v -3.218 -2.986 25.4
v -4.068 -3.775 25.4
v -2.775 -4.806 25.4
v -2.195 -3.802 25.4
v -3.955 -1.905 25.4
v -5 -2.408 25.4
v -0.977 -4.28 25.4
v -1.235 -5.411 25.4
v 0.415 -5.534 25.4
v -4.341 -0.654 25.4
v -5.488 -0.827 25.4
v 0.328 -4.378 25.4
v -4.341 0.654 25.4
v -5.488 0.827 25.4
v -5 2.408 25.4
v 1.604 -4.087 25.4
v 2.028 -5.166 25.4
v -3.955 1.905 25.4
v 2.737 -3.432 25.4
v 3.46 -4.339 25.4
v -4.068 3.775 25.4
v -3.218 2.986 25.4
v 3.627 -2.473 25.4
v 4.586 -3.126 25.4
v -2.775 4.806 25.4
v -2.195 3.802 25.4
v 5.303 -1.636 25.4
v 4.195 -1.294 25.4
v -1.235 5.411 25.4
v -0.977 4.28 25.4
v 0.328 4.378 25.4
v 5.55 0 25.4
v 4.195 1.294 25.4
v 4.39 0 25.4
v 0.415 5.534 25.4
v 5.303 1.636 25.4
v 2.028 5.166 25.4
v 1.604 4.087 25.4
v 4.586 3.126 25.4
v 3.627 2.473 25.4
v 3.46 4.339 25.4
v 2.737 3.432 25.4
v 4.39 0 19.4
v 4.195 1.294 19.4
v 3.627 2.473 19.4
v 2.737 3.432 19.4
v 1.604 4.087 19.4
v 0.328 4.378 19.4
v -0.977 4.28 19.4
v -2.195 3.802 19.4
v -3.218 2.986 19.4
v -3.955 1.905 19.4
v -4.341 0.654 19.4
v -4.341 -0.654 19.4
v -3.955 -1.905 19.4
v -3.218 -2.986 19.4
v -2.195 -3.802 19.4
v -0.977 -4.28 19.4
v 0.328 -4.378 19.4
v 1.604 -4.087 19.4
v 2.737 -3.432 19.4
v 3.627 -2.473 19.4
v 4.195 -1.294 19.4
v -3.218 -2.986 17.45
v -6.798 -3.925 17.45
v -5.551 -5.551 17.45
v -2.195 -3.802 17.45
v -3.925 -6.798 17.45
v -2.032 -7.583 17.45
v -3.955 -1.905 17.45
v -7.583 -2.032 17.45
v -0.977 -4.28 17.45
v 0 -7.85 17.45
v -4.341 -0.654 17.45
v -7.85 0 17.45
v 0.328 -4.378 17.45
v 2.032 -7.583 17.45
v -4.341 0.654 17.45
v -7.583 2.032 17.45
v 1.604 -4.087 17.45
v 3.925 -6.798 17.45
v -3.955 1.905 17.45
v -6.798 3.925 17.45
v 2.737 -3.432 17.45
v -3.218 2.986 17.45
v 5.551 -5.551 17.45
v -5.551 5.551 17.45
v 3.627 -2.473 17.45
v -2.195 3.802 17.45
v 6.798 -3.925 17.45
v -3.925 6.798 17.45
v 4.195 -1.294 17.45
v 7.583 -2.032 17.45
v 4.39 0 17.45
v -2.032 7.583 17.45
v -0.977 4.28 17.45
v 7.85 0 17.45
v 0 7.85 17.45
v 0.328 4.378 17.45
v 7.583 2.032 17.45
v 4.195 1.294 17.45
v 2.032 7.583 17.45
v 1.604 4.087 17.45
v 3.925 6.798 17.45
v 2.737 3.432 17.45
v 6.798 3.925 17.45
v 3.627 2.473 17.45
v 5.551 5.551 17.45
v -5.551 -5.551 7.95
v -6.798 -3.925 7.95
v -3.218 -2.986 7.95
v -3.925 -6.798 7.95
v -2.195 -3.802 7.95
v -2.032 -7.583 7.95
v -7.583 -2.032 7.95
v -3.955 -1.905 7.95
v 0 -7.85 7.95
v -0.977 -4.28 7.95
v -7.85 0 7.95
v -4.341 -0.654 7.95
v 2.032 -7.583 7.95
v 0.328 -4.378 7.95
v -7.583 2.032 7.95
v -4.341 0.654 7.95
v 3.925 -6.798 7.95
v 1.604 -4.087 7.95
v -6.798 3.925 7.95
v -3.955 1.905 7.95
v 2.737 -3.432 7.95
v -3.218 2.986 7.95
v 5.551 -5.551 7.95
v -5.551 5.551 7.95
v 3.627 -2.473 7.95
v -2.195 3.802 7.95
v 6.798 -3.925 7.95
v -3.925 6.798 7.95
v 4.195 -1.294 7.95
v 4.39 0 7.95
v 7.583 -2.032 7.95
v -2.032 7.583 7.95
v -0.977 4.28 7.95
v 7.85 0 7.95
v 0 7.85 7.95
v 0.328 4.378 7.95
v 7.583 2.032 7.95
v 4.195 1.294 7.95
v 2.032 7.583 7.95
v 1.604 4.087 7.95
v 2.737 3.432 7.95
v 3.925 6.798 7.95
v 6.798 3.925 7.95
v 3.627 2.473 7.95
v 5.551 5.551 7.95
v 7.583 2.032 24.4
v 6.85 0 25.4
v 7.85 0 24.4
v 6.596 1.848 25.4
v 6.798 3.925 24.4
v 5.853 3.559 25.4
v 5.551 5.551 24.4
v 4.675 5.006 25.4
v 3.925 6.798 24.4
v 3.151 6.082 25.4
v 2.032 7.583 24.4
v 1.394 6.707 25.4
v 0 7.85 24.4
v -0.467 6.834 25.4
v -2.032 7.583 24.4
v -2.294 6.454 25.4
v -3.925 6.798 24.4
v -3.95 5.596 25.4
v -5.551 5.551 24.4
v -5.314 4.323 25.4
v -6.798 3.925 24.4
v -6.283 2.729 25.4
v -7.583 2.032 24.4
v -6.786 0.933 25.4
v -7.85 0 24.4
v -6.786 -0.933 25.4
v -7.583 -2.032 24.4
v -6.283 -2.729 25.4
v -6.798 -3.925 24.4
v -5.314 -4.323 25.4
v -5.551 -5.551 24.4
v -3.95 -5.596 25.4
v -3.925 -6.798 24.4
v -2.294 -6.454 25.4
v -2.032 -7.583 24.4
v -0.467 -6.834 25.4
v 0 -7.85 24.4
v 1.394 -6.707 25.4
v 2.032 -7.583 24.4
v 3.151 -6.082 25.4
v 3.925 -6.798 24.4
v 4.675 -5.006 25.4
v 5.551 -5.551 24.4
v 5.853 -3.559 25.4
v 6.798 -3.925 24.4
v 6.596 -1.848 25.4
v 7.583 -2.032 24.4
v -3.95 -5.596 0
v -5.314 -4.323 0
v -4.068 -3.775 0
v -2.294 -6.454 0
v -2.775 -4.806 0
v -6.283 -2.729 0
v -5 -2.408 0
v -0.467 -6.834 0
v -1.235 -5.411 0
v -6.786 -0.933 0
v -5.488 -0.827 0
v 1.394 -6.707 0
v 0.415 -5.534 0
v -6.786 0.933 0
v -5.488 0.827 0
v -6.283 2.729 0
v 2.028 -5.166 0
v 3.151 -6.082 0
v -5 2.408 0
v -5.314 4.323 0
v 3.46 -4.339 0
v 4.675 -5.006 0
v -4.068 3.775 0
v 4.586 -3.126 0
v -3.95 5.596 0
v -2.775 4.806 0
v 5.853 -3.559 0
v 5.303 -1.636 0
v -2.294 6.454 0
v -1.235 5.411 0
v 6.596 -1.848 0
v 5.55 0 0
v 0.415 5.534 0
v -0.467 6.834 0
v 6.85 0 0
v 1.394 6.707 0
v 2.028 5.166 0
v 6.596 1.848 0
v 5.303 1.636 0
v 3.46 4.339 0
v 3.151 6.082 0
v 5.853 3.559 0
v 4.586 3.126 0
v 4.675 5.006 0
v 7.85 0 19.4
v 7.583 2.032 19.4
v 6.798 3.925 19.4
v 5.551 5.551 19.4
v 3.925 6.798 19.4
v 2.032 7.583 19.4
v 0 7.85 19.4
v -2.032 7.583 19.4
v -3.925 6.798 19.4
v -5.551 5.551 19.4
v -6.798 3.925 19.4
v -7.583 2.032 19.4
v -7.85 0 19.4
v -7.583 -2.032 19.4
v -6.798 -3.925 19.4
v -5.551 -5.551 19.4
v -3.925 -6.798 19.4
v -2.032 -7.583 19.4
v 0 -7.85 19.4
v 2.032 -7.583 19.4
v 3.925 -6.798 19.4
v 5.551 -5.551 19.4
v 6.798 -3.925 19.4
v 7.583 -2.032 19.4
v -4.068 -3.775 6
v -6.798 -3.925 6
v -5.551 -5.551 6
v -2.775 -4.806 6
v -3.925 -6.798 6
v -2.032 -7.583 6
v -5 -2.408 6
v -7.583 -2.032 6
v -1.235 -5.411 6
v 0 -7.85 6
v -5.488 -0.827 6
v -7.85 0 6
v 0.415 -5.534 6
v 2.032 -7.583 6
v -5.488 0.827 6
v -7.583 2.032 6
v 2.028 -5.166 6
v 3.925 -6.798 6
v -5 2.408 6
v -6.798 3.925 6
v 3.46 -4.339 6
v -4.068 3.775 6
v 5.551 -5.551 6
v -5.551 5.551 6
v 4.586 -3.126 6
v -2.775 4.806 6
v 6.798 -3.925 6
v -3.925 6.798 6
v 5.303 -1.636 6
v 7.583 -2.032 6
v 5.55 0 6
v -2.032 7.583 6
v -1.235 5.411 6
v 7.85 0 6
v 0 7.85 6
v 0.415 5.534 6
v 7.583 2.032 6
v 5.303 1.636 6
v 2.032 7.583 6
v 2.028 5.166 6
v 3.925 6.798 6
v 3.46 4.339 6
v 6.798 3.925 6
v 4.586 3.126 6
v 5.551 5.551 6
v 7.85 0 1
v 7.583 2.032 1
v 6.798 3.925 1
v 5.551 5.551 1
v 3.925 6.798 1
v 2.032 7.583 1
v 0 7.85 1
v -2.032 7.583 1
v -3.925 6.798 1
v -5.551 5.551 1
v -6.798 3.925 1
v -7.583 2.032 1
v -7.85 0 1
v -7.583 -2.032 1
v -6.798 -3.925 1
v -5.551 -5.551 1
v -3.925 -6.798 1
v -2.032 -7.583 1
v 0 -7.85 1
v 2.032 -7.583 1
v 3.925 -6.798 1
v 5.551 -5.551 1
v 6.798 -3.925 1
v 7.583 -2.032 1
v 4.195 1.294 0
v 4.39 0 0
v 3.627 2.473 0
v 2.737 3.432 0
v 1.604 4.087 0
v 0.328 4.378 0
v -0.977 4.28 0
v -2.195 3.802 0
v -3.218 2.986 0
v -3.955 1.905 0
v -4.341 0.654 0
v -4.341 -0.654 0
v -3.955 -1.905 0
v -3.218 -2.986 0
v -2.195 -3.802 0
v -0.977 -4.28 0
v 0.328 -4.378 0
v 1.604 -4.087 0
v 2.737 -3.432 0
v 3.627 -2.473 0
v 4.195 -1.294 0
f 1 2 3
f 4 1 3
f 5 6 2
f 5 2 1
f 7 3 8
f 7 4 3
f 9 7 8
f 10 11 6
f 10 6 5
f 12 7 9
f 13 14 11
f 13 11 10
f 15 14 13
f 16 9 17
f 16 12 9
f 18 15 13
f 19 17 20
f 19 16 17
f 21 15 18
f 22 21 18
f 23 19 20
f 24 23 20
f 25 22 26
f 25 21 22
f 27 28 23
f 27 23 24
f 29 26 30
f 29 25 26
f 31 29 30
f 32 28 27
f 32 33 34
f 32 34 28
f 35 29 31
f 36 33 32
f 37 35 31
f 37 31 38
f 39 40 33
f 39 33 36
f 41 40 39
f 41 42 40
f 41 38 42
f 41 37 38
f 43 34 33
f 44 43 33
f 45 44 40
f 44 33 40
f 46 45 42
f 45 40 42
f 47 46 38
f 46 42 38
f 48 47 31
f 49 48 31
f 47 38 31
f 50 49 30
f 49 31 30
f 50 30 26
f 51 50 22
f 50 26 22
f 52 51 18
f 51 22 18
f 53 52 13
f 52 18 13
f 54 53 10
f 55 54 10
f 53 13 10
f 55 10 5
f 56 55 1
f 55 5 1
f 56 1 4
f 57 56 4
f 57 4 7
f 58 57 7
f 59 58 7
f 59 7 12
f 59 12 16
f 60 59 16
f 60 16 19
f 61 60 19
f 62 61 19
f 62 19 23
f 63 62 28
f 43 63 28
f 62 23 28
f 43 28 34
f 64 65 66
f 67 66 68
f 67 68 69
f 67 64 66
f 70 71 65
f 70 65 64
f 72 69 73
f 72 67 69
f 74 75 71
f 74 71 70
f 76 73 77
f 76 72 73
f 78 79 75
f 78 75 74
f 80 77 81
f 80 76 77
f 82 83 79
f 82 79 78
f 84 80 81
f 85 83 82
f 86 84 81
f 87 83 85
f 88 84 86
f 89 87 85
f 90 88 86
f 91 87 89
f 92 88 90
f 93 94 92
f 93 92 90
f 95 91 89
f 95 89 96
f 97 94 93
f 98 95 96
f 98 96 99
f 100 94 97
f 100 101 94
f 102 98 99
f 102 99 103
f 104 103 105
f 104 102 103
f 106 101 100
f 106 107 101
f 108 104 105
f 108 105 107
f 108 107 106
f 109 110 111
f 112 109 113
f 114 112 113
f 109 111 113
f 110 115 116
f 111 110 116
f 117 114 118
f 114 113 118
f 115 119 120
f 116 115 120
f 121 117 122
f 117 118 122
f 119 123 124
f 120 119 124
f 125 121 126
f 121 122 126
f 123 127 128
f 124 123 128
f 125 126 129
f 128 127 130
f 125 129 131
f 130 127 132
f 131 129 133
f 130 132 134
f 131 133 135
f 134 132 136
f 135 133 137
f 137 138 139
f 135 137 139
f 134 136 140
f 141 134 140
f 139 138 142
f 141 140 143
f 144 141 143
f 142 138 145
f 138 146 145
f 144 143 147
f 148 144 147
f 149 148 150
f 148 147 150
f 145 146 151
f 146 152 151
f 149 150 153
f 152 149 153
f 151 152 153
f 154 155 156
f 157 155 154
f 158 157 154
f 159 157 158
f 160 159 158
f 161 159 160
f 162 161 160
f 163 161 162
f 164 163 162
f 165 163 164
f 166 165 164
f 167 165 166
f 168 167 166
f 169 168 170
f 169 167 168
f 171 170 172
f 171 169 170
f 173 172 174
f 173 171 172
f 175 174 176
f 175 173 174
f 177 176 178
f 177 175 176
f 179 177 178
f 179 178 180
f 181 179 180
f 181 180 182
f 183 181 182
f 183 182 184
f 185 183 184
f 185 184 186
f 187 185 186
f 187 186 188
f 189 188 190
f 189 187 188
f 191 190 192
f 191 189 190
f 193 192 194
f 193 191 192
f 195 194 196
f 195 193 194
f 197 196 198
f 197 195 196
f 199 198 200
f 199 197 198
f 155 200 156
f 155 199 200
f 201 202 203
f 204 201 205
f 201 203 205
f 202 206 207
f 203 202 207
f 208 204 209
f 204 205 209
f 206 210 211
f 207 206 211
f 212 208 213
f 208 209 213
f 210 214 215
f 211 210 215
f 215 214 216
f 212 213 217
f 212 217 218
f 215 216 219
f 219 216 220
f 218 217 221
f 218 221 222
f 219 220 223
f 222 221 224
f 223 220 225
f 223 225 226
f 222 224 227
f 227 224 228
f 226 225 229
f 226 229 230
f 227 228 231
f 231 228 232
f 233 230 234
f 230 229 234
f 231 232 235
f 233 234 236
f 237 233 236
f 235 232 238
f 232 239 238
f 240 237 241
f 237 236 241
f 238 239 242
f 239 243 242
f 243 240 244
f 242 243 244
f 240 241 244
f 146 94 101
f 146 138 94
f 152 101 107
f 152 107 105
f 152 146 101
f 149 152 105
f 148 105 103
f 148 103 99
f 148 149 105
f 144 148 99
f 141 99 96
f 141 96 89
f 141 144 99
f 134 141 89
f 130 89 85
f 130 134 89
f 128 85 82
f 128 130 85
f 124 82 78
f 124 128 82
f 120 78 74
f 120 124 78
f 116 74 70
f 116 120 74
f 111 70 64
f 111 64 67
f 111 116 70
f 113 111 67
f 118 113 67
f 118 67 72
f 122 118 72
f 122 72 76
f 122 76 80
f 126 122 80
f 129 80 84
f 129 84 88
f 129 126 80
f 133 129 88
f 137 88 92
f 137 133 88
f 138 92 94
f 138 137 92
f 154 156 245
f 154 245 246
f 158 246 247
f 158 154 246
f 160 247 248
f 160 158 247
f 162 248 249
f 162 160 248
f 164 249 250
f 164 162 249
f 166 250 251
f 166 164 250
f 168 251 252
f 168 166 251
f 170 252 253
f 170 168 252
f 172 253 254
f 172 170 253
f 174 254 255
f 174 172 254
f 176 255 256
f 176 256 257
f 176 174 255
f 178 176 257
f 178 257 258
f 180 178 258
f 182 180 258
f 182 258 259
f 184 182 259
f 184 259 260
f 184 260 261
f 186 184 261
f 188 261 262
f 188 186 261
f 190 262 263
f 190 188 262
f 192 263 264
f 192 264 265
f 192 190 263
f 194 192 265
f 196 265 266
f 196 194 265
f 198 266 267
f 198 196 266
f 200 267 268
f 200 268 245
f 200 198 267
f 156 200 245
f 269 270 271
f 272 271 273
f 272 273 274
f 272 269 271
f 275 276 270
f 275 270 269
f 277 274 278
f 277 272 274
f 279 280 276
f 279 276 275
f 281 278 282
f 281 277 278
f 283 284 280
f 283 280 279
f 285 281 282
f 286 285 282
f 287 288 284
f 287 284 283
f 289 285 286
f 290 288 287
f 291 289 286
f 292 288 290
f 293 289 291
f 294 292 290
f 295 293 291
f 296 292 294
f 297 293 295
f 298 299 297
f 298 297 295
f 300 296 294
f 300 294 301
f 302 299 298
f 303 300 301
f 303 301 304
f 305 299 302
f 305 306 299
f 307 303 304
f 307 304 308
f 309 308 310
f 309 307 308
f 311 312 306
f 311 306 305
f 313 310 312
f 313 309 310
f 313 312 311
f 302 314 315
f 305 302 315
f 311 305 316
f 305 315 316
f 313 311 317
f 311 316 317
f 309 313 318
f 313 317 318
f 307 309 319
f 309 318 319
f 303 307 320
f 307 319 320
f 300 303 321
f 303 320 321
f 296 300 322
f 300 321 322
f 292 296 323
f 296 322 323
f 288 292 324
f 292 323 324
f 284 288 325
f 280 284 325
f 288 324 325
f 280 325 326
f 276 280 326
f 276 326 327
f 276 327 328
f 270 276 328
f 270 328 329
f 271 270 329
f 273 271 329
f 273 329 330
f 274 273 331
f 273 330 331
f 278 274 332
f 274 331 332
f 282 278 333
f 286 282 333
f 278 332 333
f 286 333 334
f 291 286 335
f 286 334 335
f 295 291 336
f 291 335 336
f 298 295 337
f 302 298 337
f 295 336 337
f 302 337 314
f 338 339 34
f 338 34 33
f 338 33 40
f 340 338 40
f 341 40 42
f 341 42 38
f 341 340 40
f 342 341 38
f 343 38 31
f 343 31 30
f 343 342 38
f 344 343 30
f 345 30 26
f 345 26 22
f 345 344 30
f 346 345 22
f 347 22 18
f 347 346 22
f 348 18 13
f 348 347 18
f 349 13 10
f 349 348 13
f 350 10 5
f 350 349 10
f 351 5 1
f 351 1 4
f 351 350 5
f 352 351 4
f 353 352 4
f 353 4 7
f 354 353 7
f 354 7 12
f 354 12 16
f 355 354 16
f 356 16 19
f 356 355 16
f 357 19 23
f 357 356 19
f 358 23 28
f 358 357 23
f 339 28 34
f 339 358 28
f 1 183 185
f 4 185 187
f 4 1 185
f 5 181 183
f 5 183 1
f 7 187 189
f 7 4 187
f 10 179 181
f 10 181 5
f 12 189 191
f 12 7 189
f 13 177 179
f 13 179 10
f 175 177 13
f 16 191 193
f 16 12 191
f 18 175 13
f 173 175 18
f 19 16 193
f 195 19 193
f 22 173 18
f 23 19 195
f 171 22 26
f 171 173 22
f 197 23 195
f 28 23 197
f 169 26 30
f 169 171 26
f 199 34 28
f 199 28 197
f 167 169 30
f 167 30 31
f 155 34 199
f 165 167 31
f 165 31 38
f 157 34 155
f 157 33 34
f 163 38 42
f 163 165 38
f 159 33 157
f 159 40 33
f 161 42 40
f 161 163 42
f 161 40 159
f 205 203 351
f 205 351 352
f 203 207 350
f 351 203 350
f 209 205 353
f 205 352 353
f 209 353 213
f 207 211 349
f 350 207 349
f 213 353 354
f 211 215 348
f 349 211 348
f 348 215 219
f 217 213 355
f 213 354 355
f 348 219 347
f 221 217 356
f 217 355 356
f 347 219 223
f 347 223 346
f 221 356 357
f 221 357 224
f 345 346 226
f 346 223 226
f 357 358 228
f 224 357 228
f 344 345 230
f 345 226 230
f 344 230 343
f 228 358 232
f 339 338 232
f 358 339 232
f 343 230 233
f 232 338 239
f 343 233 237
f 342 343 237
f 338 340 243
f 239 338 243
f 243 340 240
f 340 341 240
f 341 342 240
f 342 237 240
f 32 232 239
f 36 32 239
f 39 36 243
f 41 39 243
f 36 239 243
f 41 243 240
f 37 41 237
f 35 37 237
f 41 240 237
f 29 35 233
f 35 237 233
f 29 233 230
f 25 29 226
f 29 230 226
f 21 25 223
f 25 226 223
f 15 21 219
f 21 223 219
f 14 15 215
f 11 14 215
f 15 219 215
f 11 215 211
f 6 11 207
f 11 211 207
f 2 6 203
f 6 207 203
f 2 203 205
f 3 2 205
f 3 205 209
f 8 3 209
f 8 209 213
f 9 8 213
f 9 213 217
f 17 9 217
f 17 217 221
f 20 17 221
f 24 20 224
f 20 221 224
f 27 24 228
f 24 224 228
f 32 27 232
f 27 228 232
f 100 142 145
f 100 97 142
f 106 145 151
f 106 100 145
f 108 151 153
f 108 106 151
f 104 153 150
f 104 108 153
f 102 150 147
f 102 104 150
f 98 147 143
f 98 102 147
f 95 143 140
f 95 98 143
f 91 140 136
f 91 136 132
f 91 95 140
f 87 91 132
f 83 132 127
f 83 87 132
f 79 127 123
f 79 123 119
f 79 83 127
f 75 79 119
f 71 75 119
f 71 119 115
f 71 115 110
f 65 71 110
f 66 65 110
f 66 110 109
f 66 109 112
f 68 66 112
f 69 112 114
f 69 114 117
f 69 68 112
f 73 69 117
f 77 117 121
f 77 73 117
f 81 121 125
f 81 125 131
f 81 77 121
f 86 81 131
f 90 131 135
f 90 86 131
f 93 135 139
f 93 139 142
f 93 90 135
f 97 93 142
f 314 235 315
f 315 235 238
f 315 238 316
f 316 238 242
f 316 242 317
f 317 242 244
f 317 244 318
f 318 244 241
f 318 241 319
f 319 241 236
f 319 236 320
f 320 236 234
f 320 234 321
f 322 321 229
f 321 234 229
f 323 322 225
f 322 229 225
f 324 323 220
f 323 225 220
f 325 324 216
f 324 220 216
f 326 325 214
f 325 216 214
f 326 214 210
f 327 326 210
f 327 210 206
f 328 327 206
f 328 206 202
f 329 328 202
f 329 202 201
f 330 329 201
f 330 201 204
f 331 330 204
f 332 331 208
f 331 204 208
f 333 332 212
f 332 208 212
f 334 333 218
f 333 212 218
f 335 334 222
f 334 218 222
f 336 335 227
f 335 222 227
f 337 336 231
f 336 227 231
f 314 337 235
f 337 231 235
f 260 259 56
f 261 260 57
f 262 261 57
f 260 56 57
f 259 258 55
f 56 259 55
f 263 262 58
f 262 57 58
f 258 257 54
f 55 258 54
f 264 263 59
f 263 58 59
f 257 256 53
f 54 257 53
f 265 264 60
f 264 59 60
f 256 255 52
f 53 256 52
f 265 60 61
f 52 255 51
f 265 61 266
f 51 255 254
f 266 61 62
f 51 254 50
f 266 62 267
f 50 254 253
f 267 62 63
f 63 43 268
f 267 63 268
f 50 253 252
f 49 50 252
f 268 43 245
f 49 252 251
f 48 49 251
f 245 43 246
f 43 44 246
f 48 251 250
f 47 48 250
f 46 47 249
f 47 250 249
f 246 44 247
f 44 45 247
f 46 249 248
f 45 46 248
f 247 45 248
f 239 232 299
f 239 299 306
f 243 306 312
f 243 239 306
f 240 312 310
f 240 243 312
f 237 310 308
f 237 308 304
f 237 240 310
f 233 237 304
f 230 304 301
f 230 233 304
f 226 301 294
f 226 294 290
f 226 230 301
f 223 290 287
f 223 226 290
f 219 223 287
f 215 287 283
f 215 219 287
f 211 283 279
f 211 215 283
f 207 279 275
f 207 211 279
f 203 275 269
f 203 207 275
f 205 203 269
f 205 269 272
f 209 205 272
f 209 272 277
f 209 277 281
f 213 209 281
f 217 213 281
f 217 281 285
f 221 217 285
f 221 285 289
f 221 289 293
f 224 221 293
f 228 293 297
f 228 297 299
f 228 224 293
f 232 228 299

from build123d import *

# Parameters (mm, degrees)
F0_R      = 7.85
F0_R_2    = 5.55
F1_DEPTH  = 6
F2_SIZE   = 1
F5_R      = 7.85
F5_R_2    = 4.39
F6_DEPTH  = 6
F7_SIZE   = 1
F0_R_3    = 4.39
F8_DEPTH  = 25.4
F10_R     = 7.85
F10_R_2   = 4.39
F11_DEPTH = 4.75


# Not quite as in the source:
# - the program builds the solid bodies; features that only make, move or delete a surface that nothing else refers to are left out


with BuildPart() as f1:
    # F0 (on Top) → F1 (new body)
    with BuildSketch(Plane.XY):
        Circle(F0_R)
        Circle(F0_R_2, mode=Mode.SUBTRACT)
    extrude(amount=F1_DEPTH)

    # F2
    f2_edges = [f1.edges().sort_by_distance(p)[0] for p in [
        (-7.85, 0, 0),
    ]]
    chamfer(f2_edges, length=F2_SIZE)


with BuildPart() as f6:
    # F5 (on offset) → F6 (new body)
    with BuildSketch(Plane.XY.offset(25.4)):
        Circle(F5_R)
        Circle(F5_R_2, mode=Mode.SUBTRACT)
    extrude(amount=-F6_DEPTH)

    # F7
    f7_edges = [f6.edges().sort_by_distance(p)[0] for p in [
        (-7.85, 0, 25.4),
    ]]
    chamfer(f7_edges, length=F7_SIZE)


with BuildPart() as f8:
    # F0 (on Top) → F8 (new body)
    with BuildSketch(Plane.XY):
        Circle(F0_R_2)
        Circle(F0_R_3, mode=Mode.SUBTRACT)
    extrude(amount=F8_DEPTH)


with BuildPart() as f11:
    # F10 (on offset) → F11 (new body, symmetric)
    with BuildSketch(Plane.XY.offset(12.7)):
        Circle(F10_R)
        Circle(F10_R_2, mode=Mode.SUBTRACT)
    extrude(amount=F11_DEPTH, both=True)


solid = Compound([f1.part, f6.part, f8.part, f11.part])
